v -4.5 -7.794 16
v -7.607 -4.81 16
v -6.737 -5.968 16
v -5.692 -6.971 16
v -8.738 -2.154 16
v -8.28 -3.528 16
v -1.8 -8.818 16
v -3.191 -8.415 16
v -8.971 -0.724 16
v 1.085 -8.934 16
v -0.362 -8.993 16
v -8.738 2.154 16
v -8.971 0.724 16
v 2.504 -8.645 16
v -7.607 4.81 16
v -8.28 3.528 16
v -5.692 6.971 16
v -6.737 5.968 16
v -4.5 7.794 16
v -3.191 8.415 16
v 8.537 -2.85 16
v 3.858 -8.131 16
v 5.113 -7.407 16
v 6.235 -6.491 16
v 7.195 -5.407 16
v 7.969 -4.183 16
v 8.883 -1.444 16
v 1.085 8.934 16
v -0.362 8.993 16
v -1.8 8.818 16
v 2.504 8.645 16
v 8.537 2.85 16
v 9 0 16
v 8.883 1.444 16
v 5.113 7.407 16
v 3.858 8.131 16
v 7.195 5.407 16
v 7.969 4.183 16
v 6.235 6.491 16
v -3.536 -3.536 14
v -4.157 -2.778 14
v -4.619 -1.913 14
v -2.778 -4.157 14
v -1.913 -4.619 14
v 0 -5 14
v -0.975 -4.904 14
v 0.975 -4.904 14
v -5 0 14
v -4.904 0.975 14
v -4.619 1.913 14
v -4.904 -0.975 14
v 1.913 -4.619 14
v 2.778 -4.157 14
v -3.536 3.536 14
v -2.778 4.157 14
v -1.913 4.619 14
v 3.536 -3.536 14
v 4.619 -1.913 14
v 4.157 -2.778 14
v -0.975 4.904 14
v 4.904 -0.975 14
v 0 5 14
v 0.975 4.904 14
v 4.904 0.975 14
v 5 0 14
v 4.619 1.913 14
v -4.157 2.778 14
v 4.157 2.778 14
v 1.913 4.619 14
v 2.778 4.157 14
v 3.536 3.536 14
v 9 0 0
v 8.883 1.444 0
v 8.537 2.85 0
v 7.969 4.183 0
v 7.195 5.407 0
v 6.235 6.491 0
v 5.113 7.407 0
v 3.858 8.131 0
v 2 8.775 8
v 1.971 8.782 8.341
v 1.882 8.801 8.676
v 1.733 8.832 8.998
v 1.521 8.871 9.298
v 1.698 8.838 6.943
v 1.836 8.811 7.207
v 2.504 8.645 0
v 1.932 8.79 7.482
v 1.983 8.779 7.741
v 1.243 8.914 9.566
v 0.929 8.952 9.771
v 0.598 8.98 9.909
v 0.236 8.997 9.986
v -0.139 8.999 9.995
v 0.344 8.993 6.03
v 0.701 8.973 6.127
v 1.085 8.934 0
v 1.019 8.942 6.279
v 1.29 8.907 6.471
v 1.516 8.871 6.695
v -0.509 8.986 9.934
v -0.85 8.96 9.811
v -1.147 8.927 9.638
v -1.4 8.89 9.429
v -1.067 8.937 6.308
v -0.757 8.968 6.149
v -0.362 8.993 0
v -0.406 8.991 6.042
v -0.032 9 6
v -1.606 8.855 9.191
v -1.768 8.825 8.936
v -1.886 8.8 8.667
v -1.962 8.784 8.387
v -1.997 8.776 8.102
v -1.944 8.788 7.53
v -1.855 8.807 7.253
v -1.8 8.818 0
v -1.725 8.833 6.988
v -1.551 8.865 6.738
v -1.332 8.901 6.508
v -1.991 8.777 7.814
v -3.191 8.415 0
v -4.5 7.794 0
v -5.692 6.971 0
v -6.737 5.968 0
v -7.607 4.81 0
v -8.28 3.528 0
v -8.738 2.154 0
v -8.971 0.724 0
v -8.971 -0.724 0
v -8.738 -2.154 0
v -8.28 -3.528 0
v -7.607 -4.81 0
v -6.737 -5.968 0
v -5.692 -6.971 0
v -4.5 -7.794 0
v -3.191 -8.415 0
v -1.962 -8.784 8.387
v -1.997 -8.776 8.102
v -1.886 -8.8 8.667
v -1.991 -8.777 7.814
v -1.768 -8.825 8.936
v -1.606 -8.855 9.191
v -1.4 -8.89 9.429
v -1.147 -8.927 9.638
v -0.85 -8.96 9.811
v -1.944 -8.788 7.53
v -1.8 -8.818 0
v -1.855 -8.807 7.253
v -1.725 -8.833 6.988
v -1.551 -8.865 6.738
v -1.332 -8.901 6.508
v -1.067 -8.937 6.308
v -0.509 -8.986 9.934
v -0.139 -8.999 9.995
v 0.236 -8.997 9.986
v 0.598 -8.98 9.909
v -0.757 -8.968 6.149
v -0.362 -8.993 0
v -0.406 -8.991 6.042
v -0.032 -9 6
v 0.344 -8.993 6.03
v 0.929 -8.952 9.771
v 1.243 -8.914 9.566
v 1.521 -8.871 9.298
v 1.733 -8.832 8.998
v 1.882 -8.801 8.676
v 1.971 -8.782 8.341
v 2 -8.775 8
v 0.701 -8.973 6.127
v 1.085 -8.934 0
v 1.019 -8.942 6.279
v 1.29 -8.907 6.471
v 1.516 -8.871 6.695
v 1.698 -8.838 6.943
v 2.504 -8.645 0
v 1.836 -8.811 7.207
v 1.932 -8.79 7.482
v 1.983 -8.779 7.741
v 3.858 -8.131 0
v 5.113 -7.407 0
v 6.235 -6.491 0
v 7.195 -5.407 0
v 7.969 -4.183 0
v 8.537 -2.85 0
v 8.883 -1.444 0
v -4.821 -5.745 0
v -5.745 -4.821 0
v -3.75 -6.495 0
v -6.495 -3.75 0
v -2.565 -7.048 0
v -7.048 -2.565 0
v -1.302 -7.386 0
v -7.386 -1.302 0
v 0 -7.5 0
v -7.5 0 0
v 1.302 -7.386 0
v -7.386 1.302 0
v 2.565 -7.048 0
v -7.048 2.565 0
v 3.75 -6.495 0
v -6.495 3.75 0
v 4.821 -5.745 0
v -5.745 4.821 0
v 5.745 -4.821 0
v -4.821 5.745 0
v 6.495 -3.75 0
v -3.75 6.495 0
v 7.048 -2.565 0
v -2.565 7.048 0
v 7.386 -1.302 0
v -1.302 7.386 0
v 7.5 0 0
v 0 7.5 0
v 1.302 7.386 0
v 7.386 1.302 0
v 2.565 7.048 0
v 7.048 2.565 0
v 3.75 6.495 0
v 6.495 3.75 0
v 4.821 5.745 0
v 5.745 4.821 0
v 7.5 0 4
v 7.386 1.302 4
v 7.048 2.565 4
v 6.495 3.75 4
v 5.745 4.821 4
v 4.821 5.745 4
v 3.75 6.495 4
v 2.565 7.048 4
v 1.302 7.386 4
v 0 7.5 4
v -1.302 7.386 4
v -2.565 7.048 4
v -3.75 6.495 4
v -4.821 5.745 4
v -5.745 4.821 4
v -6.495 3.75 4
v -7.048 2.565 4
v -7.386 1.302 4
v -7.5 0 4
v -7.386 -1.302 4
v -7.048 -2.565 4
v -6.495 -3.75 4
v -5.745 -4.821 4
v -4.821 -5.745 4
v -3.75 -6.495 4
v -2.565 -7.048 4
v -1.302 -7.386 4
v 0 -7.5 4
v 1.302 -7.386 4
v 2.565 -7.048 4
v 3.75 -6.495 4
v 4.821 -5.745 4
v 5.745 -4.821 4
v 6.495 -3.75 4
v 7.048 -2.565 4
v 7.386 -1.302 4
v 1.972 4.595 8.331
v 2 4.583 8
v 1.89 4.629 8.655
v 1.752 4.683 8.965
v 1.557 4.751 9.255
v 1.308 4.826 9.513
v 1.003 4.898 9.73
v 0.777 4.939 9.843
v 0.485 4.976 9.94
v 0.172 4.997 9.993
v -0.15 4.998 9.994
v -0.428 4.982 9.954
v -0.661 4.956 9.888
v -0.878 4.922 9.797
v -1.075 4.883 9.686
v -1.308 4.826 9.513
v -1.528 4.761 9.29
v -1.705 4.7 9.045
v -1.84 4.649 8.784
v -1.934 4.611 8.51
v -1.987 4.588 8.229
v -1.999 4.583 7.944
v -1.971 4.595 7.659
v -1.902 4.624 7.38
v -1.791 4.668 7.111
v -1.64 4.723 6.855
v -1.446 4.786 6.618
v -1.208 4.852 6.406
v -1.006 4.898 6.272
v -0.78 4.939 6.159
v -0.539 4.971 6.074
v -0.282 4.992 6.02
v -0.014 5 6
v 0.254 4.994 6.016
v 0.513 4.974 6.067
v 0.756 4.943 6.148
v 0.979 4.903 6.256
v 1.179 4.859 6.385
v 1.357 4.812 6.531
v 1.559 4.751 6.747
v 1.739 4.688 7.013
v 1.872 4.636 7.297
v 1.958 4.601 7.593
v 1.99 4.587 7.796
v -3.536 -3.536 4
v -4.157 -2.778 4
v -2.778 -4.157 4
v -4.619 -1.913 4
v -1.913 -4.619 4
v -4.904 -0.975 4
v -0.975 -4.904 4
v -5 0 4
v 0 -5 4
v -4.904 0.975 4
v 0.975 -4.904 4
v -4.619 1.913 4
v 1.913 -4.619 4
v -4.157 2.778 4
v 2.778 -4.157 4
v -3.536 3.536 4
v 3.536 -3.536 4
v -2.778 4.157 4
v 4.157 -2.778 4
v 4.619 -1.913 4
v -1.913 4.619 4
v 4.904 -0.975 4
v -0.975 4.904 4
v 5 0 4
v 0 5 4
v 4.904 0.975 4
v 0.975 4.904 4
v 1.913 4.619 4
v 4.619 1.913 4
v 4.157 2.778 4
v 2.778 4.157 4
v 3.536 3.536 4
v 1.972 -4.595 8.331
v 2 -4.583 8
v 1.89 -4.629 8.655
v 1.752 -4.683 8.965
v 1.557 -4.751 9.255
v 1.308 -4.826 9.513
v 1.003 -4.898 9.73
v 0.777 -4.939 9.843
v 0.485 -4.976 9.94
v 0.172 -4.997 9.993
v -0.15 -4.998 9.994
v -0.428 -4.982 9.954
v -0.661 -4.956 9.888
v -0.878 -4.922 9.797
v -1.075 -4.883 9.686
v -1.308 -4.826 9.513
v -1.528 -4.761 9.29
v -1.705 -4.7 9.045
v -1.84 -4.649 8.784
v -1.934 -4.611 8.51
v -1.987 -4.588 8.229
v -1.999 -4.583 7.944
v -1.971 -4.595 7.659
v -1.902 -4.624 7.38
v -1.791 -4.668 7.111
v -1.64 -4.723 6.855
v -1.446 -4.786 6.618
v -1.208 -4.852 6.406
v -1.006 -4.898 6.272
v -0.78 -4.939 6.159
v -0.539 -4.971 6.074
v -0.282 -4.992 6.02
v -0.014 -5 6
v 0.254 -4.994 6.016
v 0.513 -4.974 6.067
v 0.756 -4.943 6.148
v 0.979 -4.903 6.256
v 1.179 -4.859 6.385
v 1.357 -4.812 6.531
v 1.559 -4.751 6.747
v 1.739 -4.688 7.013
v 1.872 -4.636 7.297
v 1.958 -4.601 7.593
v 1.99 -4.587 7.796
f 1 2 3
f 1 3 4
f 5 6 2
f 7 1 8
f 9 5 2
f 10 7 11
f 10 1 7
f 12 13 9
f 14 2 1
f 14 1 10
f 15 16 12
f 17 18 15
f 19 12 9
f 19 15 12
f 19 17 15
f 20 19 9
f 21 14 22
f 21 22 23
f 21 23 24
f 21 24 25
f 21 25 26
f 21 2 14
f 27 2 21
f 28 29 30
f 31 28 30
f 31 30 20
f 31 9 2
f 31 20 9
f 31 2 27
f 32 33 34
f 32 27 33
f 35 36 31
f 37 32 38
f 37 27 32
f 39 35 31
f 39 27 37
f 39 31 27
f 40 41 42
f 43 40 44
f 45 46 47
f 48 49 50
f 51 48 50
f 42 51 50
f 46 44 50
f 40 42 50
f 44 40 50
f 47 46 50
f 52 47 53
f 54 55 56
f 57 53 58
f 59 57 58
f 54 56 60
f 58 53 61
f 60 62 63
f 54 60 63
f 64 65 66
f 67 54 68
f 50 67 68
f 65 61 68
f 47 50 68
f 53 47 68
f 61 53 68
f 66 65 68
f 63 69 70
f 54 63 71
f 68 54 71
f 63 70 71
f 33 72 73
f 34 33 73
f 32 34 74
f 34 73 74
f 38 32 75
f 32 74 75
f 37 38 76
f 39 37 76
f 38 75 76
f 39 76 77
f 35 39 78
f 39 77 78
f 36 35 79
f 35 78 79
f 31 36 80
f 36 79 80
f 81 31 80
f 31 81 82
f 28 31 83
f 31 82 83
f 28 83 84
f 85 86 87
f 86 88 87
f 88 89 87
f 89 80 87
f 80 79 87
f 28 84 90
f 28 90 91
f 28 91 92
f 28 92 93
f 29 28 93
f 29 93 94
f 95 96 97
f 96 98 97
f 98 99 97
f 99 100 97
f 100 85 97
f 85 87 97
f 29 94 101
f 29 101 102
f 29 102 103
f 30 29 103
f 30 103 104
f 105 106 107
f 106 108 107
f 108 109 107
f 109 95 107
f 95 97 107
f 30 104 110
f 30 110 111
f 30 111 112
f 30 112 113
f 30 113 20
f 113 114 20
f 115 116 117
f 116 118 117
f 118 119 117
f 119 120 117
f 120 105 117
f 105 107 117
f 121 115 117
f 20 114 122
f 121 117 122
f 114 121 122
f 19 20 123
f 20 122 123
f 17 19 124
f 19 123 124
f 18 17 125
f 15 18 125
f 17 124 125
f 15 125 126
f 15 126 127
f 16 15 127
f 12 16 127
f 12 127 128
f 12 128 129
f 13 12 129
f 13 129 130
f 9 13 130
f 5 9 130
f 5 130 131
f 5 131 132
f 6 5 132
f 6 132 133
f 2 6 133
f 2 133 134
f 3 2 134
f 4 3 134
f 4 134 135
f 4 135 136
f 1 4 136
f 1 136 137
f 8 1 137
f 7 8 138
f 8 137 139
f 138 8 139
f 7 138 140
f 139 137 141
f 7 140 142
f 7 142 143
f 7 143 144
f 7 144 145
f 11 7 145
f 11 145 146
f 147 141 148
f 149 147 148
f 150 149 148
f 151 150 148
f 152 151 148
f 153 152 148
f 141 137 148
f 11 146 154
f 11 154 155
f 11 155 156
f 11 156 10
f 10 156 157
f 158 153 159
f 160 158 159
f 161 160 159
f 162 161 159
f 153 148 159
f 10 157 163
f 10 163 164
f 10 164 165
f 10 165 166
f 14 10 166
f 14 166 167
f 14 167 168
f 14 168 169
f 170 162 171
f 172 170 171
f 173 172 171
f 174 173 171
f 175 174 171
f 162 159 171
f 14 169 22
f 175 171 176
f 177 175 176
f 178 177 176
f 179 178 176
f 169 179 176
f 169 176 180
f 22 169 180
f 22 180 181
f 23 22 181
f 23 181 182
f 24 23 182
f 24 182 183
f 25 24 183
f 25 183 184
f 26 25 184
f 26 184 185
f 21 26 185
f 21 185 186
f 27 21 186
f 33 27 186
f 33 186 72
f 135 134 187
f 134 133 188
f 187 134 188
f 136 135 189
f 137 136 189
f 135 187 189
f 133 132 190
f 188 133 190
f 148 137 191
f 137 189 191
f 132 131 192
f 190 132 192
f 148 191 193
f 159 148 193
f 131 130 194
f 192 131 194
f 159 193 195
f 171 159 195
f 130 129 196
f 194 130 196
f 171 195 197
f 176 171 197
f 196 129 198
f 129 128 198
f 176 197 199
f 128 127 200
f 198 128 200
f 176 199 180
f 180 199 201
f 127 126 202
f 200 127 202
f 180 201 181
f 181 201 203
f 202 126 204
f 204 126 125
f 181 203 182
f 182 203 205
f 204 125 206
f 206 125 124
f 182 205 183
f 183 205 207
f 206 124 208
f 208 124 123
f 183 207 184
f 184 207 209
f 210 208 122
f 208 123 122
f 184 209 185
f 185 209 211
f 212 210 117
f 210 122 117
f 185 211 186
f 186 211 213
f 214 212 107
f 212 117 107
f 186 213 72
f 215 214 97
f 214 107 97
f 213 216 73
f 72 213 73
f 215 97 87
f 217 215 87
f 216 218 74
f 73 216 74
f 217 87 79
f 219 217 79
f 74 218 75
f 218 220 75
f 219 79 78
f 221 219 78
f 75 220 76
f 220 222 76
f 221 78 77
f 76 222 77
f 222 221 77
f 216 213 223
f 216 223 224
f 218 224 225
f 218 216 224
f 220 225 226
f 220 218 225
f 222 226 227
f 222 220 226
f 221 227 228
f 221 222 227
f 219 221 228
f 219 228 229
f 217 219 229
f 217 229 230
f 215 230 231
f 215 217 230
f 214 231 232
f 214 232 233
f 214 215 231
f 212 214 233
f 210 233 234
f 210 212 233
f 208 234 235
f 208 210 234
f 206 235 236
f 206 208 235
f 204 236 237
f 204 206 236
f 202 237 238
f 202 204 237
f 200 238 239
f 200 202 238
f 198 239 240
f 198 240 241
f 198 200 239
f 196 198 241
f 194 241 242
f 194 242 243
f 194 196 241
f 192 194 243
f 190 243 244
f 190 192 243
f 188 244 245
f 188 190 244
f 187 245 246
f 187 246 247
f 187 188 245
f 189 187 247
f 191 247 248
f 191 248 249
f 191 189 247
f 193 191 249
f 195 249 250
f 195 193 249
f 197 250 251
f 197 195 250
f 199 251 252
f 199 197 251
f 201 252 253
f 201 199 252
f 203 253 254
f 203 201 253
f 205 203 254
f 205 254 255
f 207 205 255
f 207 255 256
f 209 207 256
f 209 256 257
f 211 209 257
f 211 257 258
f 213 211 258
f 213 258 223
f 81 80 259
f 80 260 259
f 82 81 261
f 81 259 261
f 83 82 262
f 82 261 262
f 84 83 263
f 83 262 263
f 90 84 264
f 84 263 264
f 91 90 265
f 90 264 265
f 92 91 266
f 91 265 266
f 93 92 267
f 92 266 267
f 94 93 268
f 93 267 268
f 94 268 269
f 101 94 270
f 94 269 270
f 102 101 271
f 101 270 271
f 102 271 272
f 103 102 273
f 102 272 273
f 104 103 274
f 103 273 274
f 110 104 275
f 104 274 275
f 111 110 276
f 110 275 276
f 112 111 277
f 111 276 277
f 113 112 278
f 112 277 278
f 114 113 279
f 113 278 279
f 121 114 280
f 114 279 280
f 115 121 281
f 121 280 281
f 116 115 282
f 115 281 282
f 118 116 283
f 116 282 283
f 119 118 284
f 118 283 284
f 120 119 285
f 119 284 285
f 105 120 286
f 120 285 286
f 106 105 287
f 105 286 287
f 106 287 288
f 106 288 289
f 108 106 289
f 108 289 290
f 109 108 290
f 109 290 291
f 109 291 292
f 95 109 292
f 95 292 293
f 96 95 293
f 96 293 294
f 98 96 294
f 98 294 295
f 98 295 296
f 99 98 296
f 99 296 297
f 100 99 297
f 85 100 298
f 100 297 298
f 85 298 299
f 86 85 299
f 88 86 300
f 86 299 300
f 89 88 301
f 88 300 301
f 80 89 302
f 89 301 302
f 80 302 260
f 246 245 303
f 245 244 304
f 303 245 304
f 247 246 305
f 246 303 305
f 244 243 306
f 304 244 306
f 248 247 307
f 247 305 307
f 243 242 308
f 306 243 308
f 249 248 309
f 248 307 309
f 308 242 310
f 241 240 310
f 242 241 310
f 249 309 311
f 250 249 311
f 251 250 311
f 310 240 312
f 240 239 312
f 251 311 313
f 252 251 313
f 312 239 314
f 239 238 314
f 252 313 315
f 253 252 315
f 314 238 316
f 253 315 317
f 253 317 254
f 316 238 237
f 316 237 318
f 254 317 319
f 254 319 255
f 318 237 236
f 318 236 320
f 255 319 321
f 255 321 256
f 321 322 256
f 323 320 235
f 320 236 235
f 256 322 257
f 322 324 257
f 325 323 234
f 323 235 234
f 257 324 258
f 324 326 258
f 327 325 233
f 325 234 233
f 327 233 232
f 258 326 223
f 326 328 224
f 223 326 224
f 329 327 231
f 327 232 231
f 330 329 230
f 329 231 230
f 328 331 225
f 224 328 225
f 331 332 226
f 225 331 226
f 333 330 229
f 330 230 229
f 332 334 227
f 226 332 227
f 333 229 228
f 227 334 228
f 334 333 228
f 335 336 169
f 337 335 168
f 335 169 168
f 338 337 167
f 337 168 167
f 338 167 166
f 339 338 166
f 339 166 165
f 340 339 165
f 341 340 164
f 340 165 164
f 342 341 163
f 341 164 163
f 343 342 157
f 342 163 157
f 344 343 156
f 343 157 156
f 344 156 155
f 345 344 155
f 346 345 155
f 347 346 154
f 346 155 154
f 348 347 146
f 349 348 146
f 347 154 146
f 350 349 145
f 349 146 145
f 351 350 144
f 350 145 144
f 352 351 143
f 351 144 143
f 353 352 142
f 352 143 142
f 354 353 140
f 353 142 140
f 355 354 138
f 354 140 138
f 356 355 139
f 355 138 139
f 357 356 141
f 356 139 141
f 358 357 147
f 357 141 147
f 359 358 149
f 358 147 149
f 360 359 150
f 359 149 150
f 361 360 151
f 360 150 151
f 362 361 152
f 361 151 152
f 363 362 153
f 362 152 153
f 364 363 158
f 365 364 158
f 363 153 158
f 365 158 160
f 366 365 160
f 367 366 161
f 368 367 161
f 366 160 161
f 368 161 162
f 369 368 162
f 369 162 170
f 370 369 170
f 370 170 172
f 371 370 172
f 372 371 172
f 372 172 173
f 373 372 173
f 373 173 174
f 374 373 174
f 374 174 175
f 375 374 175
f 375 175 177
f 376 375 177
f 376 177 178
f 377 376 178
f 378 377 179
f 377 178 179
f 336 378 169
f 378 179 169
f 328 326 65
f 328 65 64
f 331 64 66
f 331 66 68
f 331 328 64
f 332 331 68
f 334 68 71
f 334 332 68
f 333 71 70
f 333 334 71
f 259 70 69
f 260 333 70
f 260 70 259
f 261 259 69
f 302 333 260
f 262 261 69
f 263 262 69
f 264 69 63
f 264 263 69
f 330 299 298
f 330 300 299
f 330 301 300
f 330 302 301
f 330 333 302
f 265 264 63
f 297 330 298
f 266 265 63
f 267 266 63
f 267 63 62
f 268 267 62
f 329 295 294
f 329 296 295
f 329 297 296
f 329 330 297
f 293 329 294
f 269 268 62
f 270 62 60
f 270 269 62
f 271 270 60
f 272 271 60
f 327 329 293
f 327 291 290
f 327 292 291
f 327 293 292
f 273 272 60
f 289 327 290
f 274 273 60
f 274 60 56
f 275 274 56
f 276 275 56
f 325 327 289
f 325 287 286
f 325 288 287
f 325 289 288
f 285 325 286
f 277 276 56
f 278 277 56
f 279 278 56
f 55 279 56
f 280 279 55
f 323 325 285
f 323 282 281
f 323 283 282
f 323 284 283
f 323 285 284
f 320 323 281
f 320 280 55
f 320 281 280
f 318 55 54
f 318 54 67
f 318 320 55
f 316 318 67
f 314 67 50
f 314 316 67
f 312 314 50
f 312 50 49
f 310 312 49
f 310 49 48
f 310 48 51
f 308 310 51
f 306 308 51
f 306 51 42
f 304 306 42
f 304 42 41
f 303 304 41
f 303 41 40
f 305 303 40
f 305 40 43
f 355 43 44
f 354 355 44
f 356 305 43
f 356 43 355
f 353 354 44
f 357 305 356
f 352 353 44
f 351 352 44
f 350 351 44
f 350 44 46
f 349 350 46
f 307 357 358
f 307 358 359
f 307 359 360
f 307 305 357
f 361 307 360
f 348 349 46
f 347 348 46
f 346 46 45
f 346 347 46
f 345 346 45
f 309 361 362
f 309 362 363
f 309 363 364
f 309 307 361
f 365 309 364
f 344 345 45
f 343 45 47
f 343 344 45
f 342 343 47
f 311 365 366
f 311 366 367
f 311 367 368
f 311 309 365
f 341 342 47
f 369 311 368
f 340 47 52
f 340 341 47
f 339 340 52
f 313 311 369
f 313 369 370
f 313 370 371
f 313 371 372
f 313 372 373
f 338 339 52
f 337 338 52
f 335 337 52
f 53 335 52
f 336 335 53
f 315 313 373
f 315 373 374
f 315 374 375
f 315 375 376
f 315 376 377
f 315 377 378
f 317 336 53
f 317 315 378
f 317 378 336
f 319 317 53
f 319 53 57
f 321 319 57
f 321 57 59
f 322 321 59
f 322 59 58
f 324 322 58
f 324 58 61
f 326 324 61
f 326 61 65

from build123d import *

# Parameters (mm, degrees)
F0_R     = 9
F0_R_2   = 7.5
F0_R_3   = 5
F1_DEPTH = 16
F2_DEPTH = 14
F3_DEPTH = 4
F4_R     = 2
F5_DEPTH = 12.5


with BuildPart() as f1:
    # F0 (on Top) → F1 (new body)
    with BuildSketch(Plane.XY):
        Circle(F0_R)
        Circle(F0_R_2, mode=Mode.SUBTRACT)
        Circle(F0_R_2)
        Circle(F0_R_3, mode=Mode.SUBTRACT)
        Circle(F0_R_3)
    extrude(amount=F1_DEPTH)

    # F0 (on Top) → F2 (cut)
    with BuildSketch(Plane.XY):
        Circle(F0_R_3)
    extrude(amount=F2_DEPTH, mode=Mode.SUBTRACT)

    # F0 (on Top) → F3 (cut)
    with BuildSketch(Plane.XY):
        Circle(F0_R_2)
        Circle(F0_R_3, mode=Mode.SUBTRACT)
    extrude(amount=F3_DEPTH, mode=Mode.SUBTRACT)

    # F4 (on Front) → F5 (cut, symmetric)
    with BuildSketch(Plane.XZ):
        with Locations((0, 8)):
            Circle(F4_R)
    extrude(amount=F5_DEPTH, both=True, mode=Mode.SUBTRACT)


solid = f1.part
